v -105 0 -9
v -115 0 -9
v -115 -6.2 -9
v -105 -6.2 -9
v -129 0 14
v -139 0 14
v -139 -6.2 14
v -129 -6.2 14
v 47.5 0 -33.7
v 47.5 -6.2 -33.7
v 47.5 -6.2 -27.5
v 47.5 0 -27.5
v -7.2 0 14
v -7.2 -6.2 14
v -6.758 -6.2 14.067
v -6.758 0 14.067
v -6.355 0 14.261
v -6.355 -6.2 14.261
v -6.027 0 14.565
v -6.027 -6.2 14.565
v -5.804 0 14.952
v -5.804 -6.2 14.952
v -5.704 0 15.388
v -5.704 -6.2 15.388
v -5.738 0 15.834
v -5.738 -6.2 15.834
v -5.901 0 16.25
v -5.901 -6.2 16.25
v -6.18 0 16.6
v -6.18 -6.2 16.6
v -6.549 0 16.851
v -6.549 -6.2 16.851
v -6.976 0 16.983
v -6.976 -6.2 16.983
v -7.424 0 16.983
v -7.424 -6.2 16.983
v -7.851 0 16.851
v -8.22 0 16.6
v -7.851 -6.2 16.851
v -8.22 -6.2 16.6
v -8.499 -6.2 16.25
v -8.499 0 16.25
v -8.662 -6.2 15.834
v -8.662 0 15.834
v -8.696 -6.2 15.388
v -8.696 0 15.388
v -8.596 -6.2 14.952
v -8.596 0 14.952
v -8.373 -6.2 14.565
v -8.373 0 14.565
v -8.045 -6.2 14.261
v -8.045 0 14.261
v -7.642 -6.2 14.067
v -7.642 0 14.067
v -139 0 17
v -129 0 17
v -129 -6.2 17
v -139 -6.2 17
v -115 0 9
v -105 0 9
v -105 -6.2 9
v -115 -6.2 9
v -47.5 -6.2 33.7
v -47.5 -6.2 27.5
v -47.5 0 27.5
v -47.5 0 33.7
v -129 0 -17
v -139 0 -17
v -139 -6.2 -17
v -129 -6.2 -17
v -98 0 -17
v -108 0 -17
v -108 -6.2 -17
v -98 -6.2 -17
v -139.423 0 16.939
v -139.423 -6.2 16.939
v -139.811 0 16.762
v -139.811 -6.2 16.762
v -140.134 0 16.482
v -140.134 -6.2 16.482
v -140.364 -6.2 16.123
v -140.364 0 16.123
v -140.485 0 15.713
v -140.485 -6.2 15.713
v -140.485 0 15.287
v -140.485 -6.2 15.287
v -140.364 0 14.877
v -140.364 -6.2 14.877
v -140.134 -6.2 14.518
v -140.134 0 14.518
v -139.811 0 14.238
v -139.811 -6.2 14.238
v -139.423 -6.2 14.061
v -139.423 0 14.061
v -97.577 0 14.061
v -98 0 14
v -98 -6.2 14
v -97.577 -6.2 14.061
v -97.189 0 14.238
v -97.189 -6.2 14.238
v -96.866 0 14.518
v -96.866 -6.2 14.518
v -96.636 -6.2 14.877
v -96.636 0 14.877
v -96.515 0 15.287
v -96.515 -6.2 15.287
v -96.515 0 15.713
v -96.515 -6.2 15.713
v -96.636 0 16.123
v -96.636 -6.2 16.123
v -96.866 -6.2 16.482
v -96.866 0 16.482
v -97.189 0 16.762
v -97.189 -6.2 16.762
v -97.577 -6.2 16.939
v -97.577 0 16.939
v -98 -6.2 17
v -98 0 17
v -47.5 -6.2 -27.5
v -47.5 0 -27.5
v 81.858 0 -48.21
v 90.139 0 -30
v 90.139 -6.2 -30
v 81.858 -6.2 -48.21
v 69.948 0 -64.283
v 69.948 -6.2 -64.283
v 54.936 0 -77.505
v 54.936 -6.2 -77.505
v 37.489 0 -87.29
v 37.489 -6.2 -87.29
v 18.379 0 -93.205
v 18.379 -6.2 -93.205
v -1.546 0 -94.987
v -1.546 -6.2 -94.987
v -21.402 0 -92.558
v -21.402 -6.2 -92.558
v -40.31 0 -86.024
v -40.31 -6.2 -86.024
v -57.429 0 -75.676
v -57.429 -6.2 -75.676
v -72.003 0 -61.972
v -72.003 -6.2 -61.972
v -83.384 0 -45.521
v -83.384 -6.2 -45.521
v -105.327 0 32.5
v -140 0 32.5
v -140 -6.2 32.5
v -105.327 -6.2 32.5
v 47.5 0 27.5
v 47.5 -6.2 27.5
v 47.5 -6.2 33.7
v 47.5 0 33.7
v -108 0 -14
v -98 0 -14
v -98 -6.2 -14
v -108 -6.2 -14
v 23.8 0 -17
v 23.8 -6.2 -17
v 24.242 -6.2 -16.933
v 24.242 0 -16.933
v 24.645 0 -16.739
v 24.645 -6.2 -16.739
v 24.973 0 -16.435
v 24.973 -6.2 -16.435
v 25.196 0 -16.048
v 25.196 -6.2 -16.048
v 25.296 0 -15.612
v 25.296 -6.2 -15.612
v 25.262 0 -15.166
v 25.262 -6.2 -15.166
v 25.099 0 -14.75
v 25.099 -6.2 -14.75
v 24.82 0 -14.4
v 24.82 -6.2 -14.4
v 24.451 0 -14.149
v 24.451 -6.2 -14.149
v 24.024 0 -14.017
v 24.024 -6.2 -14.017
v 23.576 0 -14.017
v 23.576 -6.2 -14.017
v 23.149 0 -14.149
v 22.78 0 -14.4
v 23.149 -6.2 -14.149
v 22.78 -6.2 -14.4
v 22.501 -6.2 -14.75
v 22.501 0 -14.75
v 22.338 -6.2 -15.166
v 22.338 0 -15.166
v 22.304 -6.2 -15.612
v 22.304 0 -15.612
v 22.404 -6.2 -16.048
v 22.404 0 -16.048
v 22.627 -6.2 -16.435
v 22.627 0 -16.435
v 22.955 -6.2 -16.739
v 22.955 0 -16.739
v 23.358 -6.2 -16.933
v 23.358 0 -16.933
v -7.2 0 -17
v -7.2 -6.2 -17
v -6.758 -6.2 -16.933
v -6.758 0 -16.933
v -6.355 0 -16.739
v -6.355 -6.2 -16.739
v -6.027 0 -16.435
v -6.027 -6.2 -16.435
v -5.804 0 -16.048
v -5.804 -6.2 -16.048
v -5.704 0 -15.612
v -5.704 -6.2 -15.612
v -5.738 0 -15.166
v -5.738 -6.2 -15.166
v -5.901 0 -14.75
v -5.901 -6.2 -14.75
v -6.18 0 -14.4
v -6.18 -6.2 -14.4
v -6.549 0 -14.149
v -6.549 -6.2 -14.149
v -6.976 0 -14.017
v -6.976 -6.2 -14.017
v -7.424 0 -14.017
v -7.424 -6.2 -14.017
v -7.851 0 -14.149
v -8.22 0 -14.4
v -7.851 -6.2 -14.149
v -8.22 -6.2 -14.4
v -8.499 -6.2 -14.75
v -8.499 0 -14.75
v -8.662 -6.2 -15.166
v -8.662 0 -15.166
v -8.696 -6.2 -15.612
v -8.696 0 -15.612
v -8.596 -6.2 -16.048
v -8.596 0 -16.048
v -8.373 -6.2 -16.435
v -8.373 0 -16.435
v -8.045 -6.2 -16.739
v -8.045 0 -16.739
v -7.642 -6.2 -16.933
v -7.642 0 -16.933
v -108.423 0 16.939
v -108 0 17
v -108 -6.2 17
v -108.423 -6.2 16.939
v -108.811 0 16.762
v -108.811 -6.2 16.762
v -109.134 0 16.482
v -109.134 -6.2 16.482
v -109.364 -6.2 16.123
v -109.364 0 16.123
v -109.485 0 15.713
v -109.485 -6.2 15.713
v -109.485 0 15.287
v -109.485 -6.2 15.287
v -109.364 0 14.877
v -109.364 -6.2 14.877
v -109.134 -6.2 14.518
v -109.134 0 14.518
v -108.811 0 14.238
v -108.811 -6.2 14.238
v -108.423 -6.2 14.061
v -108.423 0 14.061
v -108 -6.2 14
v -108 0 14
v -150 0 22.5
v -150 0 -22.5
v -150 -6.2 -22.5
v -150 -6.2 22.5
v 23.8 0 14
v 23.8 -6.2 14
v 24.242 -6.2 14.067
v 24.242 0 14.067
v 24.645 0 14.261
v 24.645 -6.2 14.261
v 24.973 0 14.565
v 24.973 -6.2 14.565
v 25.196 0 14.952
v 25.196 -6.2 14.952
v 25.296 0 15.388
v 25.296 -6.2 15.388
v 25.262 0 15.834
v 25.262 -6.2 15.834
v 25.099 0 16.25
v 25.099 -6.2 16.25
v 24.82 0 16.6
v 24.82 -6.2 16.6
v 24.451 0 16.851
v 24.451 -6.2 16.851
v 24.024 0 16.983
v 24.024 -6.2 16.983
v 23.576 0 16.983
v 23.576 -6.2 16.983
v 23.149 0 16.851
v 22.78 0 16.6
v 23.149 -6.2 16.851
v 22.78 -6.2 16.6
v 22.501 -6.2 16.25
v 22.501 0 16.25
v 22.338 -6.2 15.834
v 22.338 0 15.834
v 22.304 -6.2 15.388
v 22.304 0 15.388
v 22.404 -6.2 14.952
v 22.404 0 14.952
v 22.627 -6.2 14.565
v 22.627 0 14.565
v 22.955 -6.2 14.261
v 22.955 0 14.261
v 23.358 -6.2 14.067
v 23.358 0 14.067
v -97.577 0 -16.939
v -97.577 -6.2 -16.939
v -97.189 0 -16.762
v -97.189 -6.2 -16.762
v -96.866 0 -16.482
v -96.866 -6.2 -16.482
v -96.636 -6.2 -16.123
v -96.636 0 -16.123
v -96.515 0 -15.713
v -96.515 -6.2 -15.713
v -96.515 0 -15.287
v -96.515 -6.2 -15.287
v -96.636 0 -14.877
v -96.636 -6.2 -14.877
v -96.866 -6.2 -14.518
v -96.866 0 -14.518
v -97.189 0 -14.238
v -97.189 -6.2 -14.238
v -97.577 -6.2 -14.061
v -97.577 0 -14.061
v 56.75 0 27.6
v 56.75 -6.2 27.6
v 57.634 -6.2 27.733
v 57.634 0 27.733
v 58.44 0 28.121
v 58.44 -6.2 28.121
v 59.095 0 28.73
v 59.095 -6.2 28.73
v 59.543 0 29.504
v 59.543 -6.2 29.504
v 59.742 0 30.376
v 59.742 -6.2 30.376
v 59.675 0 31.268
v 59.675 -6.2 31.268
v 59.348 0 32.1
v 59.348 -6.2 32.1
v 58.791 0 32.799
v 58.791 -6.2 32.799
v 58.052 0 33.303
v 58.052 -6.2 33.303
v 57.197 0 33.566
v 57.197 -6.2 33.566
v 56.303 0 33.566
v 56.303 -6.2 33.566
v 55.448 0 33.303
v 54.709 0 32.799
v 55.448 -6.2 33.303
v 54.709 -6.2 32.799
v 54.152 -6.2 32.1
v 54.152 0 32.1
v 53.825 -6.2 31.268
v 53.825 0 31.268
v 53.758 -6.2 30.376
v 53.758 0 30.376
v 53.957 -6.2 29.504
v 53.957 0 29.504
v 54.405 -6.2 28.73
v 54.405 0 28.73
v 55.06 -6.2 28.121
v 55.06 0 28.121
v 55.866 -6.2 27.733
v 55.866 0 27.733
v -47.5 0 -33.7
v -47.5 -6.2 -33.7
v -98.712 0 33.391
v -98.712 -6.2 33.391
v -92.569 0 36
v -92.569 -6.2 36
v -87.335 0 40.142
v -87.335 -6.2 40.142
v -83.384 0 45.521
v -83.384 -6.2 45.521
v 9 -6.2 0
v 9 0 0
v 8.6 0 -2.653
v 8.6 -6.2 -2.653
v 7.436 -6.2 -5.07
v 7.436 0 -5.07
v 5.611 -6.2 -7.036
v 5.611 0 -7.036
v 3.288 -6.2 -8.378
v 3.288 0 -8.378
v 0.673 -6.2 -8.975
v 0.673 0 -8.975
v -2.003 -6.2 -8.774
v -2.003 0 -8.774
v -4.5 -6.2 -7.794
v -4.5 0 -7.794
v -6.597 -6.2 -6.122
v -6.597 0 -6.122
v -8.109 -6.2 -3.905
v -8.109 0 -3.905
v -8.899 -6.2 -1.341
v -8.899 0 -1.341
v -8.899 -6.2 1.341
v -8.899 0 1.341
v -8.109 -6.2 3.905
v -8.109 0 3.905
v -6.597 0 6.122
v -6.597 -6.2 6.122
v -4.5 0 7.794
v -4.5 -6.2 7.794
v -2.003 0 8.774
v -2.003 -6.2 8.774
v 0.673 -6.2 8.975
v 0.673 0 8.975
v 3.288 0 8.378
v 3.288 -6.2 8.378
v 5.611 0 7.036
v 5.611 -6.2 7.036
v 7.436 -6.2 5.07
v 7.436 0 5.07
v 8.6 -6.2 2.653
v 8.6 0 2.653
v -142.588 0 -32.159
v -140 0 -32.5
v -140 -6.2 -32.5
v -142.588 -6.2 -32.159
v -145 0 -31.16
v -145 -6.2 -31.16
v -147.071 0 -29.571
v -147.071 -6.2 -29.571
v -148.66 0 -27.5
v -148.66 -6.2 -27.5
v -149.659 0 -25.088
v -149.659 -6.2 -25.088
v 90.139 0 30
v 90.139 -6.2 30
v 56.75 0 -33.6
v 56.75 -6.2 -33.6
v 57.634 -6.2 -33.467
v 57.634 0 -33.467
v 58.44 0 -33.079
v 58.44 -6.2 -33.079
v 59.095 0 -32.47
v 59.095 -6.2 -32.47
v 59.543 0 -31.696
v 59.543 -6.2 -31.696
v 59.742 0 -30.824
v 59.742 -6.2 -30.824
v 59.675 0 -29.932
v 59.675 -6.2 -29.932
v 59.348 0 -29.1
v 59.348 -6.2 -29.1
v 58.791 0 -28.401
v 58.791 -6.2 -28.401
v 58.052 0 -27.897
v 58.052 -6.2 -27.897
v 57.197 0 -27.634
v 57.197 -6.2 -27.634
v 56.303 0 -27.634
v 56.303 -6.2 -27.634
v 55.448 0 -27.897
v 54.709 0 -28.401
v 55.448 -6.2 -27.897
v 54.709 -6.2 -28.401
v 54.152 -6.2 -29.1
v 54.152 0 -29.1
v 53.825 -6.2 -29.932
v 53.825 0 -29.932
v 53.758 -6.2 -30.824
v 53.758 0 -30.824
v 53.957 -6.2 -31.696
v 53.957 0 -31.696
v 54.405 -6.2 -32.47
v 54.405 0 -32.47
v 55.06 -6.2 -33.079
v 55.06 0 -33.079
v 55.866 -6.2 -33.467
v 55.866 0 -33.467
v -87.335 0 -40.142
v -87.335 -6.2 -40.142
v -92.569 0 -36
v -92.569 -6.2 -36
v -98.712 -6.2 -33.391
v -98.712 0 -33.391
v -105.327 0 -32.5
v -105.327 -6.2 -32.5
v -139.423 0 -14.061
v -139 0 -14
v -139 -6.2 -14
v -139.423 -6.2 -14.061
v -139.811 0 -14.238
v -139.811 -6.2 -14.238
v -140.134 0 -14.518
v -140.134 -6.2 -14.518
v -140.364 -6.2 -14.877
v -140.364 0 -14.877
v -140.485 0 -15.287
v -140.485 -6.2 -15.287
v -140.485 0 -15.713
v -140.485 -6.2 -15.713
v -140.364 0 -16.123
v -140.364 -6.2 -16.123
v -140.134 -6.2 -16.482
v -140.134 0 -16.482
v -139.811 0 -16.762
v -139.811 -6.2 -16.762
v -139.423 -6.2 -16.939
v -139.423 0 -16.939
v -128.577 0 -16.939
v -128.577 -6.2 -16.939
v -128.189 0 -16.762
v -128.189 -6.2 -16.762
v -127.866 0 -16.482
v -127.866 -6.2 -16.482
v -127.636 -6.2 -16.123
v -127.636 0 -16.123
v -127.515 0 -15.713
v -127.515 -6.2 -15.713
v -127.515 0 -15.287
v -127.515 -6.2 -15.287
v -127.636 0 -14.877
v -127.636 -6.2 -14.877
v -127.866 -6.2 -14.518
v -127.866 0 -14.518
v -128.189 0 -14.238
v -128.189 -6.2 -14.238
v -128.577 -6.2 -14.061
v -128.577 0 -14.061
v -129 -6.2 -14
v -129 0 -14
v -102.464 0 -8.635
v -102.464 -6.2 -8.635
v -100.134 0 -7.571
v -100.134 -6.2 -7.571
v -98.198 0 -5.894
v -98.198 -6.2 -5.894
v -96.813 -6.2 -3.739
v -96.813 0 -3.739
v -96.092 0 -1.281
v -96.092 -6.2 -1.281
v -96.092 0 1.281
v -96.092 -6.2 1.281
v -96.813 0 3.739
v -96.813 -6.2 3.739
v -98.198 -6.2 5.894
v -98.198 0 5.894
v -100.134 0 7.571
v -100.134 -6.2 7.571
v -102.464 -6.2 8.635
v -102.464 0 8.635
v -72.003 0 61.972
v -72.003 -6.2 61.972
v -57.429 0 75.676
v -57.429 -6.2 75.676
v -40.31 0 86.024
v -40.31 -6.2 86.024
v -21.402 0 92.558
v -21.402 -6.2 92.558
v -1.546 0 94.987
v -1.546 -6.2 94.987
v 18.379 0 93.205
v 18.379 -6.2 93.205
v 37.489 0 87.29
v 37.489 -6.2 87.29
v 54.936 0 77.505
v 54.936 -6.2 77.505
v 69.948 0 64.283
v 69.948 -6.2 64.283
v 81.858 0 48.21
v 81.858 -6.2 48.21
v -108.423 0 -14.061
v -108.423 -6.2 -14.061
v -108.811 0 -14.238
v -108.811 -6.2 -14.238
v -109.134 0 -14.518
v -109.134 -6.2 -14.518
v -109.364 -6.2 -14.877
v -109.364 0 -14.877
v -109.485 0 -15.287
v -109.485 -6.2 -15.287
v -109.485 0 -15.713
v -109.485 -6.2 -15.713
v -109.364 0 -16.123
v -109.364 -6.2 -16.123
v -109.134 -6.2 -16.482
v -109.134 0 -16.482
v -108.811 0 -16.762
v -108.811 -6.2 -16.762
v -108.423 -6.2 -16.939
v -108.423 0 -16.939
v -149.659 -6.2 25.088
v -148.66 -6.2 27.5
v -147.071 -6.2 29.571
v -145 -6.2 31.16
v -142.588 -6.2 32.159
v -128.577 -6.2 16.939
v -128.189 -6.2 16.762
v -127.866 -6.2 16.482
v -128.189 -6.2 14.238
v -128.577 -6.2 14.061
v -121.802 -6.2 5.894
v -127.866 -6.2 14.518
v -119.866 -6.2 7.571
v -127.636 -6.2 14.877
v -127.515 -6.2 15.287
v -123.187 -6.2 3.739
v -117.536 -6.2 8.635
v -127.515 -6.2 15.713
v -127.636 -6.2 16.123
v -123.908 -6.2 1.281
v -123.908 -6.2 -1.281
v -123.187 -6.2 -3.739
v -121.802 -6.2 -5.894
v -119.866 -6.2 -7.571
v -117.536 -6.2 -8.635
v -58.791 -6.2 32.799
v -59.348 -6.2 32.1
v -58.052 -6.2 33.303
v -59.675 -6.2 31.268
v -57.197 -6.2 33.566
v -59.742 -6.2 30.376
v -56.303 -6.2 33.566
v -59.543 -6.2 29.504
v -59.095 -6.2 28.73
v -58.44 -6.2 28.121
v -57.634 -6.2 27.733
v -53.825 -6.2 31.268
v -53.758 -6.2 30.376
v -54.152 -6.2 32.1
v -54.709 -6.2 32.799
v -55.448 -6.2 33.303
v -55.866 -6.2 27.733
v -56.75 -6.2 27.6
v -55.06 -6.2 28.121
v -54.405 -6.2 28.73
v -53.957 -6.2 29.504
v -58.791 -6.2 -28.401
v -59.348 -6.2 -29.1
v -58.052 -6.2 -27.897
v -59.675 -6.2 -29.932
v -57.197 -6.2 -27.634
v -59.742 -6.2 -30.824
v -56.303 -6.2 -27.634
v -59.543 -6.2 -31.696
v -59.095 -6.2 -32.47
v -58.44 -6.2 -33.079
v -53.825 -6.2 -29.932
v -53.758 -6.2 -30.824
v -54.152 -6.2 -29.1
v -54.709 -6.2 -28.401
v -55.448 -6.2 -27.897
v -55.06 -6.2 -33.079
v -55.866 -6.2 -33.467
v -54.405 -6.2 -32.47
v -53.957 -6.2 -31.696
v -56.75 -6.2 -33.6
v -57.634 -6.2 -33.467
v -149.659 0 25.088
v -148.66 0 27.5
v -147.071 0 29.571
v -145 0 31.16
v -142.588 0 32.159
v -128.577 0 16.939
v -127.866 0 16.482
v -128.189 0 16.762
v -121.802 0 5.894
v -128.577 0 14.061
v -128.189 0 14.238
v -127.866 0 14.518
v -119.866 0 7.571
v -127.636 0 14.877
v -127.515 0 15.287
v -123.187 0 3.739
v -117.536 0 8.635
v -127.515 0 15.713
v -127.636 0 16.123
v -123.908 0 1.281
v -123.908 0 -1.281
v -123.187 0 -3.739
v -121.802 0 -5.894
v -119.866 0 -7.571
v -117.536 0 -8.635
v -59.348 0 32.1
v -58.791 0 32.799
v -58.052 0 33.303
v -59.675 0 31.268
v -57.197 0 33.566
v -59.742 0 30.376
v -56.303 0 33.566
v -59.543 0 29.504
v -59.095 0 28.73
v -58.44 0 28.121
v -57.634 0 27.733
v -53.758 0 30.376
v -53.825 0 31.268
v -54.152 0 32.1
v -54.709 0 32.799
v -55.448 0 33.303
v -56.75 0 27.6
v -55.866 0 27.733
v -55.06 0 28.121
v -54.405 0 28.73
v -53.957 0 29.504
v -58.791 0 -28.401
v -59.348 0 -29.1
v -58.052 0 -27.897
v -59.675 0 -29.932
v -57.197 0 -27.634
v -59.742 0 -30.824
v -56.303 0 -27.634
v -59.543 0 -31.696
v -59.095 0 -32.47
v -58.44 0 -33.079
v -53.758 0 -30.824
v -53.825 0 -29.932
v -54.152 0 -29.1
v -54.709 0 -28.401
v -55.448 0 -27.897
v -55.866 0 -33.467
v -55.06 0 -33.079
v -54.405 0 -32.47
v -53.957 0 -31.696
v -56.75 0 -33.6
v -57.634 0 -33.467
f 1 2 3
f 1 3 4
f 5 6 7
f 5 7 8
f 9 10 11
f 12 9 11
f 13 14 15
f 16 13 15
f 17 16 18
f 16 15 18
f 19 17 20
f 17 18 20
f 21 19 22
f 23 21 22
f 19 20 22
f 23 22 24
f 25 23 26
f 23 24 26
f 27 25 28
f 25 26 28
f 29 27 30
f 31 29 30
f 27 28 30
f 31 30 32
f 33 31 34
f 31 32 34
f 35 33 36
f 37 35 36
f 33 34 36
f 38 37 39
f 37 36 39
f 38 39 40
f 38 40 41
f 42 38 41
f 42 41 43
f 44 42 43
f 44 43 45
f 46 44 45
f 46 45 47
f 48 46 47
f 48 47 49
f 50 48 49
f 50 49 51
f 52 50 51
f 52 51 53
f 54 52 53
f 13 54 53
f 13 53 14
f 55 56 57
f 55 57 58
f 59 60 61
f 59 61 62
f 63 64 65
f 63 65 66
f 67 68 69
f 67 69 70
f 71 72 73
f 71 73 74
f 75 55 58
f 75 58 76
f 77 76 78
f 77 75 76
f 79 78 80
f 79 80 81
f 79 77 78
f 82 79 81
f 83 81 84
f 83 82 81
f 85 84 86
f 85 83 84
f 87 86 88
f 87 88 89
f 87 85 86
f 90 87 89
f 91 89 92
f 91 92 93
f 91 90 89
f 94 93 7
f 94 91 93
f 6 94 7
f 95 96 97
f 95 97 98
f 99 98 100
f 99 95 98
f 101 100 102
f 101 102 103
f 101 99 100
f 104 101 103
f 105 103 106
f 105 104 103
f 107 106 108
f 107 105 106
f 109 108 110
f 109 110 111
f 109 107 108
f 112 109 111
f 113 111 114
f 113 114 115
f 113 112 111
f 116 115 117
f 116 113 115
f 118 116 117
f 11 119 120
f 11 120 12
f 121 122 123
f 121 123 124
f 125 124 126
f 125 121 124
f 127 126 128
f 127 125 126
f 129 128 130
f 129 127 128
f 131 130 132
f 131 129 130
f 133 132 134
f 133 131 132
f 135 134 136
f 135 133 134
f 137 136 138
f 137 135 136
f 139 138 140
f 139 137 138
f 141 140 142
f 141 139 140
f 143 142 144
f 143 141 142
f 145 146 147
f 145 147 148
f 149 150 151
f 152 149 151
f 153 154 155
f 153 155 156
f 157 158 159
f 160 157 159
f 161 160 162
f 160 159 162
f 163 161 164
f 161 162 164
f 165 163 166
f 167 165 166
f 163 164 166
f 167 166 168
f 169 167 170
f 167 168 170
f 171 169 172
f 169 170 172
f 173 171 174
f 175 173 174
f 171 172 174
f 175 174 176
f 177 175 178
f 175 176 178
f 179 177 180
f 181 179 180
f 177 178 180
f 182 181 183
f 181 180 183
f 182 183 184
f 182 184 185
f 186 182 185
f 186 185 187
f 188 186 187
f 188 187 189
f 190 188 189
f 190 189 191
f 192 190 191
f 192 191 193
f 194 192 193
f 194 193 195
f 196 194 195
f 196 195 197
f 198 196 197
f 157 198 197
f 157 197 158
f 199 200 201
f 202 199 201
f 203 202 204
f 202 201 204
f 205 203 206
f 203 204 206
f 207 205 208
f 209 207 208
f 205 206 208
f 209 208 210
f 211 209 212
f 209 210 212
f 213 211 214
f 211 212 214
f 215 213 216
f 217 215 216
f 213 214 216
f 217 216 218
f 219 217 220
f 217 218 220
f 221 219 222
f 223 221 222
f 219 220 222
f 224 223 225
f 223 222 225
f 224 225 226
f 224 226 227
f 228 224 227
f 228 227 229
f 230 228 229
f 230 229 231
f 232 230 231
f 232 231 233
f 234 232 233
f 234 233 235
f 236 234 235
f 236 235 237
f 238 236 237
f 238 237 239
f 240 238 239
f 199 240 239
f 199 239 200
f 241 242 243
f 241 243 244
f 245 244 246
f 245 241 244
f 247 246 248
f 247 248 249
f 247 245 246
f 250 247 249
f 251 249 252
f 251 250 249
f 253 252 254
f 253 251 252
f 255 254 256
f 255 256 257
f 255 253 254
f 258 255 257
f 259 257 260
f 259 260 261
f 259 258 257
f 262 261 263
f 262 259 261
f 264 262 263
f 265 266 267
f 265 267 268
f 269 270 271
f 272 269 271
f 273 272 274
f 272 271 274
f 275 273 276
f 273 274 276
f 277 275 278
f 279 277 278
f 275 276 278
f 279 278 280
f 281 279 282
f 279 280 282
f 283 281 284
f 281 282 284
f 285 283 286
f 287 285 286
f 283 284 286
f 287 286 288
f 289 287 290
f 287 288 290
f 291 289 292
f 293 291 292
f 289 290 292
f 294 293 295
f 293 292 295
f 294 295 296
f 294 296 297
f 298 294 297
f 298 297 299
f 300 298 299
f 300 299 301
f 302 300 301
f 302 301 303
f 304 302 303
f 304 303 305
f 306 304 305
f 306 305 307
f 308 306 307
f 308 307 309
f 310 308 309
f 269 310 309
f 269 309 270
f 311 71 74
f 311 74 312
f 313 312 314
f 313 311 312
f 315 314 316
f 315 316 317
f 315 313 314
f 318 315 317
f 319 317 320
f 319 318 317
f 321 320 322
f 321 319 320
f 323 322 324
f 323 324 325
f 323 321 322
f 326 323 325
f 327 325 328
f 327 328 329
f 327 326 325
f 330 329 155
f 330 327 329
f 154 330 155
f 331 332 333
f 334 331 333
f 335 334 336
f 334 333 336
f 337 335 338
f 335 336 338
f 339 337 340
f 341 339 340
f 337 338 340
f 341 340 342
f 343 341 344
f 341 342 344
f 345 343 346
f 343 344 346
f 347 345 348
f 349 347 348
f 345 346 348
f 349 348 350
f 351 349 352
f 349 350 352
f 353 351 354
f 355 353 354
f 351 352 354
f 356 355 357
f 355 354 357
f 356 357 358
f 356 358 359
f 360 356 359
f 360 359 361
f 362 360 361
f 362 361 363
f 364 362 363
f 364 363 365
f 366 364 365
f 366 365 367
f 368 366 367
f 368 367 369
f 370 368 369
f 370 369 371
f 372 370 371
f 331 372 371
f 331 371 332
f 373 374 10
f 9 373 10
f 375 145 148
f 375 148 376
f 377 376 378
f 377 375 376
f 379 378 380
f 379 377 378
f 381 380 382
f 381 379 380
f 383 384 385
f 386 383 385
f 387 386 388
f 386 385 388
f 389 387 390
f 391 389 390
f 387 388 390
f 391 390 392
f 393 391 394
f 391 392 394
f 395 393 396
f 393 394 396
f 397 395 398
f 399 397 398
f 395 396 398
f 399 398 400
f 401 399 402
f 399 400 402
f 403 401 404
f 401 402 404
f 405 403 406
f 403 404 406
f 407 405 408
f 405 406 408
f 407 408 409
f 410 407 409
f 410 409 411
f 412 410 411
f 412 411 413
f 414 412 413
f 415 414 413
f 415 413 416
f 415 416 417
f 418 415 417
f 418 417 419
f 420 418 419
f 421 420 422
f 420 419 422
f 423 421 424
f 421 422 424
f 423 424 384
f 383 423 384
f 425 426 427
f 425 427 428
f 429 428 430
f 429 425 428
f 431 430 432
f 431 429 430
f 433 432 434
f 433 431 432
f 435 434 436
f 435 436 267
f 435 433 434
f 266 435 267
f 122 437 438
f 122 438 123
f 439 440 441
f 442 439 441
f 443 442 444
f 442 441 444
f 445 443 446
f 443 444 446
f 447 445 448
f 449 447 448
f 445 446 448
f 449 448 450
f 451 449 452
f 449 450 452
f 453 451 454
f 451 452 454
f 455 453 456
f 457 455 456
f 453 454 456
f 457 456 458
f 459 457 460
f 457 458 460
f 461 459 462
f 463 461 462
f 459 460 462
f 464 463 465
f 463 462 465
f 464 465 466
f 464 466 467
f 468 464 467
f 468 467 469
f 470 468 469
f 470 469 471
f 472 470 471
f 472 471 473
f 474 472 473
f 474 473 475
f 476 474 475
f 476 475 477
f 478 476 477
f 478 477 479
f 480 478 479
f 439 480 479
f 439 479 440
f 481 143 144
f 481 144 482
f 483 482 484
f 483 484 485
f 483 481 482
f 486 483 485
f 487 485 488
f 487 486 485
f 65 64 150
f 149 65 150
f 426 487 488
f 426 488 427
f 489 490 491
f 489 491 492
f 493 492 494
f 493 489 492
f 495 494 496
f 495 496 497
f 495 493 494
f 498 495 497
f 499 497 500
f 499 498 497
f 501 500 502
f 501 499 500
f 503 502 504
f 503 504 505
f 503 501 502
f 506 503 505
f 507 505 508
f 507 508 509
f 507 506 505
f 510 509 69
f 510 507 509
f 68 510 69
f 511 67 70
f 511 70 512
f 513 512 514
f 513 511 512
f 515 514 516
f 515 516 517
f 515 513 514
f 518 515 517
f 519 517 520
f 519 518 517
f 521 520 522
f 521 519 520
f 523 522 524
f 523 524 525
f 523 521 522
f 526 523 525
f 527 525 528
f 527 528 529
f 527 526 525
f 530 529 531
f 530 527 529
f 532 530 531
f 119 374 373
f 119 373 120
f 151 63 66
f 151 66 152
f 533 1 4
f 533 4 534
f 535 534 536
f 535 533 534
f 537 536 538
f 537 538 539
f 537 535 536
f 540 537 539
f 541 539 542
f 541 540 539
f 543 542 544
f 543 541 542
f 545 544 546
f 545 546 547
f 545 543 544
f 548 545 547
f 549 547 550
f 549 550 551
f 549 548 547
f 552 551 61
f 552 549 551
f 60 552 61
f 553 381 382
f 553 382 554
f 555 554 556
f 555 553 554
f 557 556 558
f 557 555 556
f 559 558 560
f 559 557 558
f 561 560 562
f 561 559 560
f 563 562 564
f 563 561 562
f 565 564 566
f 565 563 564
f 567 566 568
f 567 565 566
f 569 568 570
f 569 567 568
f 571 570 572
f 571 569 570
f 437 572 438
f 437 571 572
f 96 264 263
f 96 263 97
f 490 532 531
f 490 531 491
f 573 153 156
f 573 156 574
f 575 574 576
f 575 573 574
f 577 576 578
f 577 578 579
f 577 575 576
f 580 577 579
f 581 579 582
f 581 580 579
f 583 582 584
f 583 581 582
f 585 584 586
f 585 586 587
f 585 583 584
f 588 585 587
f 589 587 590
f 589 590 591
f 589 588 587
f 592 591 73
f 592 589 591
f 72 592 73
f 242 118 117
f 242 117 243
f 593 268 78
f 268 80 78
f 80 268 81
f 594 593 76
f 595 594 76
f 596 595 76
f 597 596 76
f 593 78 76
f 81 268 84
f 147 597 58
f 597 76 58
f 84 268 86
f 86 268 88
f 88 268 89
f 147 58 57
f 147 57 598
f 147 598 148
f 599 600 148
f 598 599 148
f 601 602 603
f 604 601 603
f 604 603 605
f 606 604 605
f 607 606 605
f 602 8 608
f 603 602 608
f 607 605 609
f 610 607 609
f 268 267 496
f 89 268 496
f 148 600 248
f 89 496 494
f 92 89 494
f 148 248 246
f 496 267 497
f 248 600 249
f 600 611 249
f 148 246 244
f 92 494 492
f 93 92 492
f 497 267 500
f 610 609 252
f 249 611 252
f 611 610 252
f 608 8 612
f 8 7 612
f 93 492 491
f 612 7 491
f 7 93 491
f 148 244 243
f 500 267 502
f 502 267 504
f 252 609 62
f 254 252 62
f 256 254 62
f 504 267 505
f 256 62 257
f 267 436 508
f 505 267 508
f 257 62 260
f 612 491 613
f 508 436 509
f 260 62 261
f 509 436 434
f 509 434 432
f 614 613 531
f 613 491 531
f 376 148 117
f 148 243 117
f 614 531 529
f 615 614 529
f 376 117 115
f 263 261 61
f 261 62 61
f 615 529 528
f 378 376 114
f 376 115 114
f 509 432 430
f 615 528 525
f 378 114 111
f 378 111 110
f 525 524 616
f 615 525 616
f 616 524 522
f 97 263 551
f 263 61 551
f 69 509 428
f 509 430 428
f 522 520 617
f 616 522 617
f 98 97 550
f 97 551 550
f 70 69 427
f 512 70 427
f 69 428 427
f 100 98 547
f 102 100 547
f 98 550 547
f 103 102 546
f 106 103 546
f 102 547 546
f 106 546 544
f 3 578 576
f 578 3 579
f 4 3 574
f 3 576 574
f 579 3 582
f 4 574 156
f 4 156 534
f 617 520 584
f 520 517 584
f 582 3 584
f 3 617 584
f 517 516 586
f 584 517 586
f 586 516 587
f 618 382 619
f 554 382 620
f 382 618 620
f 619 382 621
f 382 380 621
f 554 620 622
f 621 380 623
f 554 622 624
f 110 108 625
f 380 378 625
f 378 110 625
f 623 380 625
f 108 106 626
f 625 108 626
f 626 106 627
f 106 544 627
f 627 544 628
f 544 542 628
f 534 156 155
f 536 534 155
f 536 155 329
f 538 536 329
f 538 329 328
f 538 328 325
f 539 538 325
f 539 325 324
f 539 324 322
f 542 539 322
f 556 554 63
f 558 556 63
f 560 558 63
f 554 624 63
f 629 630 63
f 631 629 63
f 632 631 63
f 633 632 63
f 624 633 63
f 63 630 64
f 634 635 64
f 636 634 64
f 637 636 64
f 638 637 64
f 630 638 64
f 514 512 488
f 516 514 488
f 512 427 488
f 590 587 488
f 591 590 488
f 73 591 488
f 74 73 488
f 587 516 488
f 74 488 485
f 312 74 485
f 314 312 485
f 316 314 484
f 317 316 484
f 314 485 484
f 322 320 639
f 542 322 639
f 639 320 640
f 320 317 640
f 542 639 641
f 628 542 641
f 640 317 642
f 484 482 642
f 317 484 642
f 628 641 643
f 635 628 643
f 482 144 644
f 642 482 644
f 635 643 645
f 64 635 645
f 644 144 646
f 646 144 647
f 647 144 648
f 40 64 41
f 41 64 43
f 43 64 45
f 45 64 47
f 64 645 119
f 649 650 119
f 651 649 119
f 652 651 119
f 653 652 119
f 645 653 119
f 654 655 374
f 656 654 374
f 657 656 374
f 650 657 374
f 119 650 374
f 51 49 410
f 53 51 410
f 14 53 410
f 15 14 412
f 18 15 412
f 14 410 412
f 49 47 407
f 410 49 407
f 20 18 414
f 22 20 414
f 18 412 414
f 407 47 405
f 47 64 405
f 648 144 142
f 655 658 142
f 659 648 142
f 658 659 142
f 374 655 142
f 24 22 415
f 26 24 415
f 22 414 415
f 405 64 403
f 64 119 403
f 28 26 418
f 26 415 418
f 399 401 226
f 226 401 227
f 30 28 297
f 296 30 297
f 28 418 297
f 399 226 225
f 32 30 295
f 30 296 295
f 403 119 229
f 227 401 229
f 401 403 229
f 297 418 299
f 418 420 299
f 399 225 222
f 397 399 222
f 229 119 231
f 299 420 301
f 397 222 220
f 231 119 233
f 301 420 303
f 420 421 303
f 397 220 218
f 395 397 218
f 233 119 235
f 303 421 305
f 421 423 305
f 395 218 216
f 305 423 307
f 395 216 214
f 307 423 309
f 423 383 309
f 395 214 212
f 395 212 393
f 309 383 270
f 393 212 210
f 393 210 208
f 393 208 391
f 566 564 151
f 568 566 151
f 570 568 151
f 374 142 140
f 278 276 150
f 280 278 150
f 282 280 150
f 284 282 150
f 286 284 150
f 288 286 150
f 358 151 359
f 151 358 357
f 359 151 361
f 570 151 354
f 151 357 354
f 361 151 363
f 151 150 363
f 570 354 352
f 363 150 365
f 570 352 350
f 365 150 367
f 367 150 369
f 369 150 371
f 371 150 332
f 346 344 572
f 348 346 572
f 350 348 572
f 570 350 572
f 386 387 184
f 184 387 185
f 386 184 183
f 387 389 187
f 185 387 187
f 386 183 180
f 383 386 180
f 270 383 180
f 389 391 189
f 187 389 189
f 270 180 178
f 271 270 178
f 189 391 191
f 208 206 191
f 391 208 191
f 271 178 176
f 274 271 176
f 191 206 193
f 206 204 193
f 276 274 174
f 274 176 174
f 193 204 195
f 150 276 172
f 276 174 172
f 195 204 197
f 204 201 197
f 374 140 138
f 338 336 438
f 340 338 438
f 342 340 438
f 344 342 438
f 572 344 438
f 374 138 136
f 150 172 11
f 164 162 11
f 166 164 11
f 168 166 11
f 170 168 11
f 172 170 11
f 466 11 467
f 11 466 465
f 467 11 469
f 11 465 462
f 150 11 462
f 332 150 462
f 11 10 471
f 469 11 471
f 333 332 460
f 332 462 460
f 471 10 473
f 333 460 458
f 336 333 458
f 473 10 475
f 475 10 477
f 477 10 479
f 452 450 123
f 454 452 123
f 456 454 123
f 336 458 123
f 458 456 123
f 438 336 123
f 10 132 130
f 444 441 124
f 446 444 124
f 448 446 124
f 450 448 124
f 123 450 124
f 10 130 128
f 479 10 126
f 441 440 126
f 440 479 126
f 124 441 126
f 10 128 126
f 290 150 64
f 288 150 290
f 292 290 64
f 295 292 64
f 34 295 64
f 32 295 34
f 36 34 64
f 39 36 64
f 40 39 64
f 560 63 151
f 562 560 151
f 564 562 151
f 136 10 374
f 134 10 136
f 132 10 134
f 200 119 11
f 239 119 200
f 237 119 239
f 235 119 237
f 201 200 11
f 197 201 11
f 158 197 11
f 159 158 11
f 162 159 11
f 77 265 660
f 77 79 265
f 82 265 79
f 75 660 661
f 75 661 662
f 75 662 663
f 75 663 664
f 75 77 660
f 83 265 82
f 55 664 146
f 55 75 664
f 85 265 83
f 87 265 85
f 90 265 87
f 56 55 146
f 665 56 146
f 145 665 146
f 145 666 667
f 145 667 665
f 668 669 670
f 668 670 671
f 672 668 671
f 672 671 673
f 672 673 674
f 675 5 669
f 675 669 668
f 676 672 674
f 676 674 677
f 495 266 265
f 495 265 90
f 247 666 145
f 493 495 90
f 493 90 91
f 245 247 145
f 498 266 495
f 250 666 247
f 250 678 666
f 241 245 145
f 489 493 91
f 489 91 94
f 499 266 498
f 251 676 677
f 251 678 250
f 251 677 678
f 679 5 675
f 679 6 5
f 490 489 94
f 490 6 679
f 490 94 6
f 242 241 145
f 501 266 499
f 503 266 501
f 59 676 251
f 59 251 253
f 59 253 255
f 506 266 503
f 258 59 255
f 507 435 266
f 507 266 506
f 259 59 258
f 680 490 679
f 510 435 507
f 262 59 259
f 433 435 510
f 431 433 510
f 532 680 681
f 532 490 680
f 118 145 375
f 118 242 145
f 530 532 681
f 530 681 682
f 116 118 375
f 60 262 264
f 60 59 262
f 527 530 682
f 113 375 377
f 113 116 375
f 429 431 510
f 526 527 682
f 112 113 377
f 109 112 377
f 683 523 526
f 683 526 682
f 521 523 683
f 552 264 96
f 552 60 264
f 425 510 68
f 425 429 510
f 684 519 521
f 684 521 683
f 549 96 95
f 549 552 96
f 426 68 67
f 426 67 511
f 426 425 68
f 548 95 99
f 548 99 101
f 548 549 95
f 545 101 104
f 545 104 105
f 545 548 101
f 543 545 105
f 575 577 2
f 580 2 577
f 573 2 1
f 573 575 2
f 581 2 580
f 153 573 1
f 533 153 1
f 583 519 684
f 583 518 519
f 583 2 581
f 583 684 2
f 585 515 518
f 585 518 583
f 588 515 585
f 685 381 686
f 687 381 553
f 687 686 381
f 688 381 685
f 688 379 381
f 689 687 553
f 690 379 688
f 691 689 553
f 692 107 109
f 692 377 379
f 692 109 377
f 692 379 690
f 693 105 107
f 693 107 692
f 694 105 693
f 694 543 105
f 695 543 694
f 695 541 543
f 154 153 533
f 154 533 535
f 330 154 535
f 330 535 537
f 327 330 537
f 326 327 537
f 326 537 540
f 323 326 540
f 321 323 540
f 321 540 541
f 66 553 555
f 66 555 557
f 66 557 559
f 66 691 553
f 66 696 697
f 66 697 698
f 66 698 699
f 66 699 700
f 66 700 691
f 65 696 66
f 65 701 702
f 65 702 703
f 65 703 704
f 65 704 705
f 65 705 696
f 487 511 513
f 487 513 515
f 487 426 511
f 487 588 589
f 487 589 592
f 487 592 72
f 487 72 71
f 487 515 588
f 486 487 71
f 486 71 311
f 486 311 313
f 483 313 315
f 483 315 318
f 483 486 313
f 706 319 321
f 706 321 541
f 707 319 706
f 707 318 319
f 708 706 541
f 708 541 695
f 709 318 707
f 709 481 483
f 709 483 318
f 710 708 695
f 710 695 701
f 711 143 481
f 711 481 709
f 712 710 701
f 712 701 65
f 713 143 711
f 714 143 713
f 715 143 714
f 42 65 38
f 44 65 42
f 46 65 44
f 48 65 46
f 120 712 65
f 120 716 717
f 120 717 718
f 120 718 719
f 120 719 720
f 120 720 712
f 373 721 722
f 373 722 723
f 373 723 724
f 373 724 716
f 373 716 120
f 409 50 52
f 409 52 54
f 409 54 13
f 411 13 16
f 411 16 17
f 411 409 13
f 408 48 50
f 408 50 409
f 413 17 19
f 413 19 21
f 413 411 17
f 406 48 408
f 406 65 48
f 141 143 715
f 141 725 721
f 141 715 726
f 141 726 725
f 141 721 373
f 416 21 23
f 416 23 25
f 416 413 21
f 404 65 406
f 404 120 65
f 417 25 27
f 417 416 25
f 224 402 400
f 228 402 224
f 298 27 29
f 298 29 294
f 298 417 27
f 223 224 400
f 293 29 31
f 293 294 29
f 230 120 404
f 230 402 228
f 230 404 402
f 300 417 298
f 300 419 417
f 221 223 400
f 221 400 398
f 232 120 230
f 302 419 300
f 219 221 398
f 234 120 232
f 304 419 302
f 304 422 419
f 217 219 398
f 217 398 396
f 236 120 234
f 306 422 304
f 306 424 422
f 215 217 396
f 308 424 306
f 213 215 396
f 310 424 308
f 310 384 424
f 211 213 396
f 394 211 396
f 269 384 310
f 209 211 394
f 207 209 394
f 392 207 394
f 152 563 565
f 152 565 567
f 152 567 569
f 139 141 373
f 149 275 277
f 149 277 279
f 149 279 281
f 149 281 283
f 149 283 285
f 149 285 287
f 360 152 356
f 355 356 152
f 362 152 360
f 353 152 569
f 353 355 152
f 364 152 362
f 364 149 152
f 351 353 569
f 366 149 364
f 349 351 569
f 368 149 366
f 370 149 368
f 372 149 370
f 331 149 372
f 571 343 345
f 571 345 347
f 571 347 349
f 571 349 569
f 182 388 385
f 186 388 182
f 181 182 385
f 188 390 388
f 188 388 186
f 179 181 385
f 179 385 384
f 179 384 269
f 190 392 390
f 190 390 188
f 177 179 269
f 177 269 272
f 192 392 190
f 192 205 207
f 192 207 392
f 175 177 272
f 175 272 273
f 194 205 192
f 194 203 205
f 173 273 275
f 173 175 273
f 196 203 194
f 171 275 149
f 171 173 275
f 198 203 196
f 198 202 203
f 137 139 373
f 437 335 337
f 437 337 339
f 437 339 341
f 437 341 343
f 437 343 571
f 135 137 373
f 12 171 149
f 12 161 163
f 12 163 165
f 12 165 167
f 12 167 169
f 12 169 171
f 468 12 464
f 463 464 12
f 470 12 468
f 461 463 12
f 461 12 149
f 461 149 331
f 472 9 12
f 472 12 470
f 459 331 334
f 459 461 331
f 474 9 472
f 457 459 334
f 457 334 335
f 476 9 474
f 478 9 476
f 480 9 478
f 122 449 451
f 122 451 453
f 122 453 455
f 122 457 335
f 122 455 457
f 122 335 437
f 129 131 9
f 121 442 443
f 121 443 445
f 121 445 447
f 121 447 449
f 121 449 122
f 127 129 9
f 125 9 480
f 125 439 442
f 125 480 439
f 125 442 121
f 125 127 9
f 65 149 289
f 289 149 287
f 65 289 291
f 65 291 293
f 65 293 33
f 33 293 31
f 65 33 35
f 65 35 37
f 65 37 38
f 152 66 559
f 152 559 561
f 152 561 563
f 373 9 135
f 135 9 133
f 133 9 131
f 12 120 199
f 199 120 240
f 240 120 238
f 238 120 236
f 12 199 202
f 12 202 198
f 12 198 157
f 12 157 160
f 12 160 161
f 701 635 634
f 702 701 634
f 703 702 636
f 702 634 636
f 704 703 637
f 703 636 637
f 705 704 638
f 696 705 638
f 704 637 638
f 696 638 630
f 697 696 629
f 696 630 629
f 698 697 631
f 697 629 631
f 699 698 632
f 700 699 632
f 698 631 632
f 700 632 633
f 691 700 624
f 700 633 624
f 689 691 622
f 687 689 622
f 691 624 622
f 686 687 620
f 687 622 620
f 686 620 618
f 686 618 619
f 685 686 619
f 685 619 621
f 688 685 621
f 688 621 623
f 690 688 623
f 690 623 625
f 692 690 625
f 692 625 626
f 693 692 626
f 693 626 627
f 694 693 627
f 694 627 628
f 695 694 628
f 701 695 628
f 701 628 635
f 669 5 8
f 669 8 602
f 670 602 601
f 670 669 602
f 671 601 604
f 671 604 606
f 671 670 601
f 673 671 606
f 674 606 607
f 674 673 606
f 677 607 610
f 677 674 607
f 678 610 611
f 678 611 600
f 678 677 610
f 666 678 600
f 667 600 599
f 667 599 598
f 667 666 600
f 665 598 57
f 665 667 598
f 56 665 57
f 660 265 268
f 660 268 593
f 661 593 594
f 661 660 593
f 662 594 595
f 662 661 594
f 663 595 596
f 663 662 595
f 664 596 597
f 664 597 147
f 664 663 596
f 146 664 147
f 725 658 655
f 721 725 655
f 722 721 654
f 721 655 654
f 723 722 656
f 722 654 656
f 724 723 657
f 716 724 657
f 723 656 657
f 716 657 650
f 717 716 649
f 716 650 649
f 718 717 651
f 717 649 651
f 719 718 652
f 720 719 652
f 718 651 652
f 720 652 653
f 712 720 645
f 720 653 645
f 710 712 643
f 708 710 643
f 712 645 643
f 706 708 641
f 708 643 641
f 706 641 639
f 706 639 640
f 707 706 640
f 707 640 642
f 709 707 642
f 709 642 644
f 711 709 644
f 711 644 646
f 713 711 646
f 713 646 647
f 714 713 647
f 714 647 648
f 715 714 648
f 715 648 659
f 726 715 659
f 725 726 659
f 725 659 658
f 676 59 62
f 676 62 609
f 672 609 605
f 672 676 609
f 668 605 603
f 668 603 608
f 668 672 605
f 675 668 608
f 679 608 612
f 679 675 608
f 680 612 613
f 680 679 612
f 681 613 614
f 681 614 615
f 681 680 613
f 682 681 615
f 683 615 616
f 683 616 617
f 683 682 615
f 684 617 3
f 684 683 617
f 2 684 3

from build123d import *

# Parameters (mm, degrees)
SKETCH1_R           = 9
BOSS_EXTRUDE1_DEPTH = 6.2
CUT_EXTRUDE1_REACH  = 179.661
SKETCH2_R           = 1.5
CUT_EXTRUDE2_REACH  = 179.661
SKETCH3_R           = 3
LPATTERN1_COUNT     = 2
LPATTERN1_PITCH     = 61.2
CUT_EXTRUDE3_REACH  = 179.661
SKETCH5_W           = 95
SKETCH5_H           = 6.2


with BuildPart() as part:
    # Sketch1 → Boss-Extrude1 (new body)
    with BuildSketch(Plane(origin=(0, 0, 0), x_dir=(1, 0, 0), z_dir=(0, 1, 0))):
        with BuildLine():
            ThreePointArc((-140, 32.5), (-147.071067812, 29.571067812), (-150, 22.5))
            Line((-150, 22.5), (-150, -22.5))
            ThreePointArc((-150, -22.5), (-147.071067812, -29.571067812), (-140, -32.5))
            Line((-140, -32.5), (-105.326872165, -32.5))
            ThreePointArc((-105.326872165, -32.5), (-92.569113088, -36.000242249), (-83.383773797, -45.520833333))
            ThreePointArc((-83.383773797, -45.520833333), (8.463545381, -94.622240512), (90.138781887, -30))
            Line((90.138781887, -30), (90.138781887, 30))
            ThreePointArc((90.138781887, 30), (8.463545381, 94.622240512), (-83.383773797, 45.520833333))
            ThreePointArc((-83.383773797, 45.520833333), (-92.569113088, 36.000242249), (-105.326872165, 32.5))
            Line((-105.326872165, 32.5), (-140, 32.5))
        make_face()
        with BuildLine():
            ThreePointArc((-139, -17), (-140.5, -15.5), (-139, -14))
            Line((-139, -14), (-129, -14))
            ThreePointArc((-129, -14), (-127.5, -15.5), (-129, -17))
            Line((-129, -17), (-139, -17))
        make_face(mode=Mode.SUBTRACT)
        with BuildLine():
            ThreePointArc((-108, -17), (-109.5, -15.5), (-108, -14))
            Line((-108, -14), (-98, -14))
            ThreePointArc((-98, -14), (-96.5, -15.5), (-98, -17))
            Line((-98, -17), (-108, -17))
        make_face(mode=Mode.SUBTRACT)
        with BuildLine():
            ThreePointArc((-115, -9), (-124, 0), (-115, 9))
            Line((-115, 9), (-105, 9))
            ThreePointArc((-105, 9), (-96, 0), (-105, -9))
            Line((-105, -9), (-115, -9))
        make_face(mode=Mode.SUBTRACT)
        Circle(SKETCH1_R, mode=Mode.SUBTRACT)
        with BuildLine():
            ThreePointArc((-139, 14), (-140.5, 15.5), (-139, 17))
            Line((-139, 17), (-129, 17))
            ThreePointArc((-129, 17), (-127.5, 15.5), (-129, 14))
            Line((-129, 14), (-139, 14))
        make_face(mode=Mode.SUBTRACT)
        with BuildLine():
            ThreePointArc((-108, 14), (-109.5, 15.5), (-108, 17))
            Line((-108, 17), (-98, 17))
            ThreePointArc((-98, 17), (-96.5, 15.5), (-98, 14))
            Line((-98, 14), (-108, 14))
        make_face(mode=Mode.SUBTRACT)
    extrude(amount=-BOSS_EXTRUDE1_DEPTH)

    # Sketch2 → Cut-Extrude1 (cut, up to next)
    with BuildSketch(Plane.XZ.offset(6.2), mode=Mode.PRIVATE) as cut_extrude1_sk1:
        with Locations(Location((-7.2, 15.5, 0), (0, 0, 270))):
            Circle(SKETCH2_R)
    cut_extrude1_tool1 = extrude(cut_extrude1_sk1.sketch, amount=-CUT_EXTRUDE1_REACH, mode=Mode.PRIVATE) & part.part
    # Sketch2 → Cut-Extrude1 (cut, up to next)
    with BuildSketch(Plane.XZ.offset(6.2), mode=Mode.PRIVATE) as cut_extrude1_sk2:
        with Locations(Location((-7.2, -15.5, 0), (0, 0, 270))):
            Circle(SKETCH2_R)
    cut_extrude1_tool2 = extrude(cut_extrude1_sk2.sketch, amount=-CUT_EXTRUDE1_REACH, mode=Mode.PRIVATE) & part.part
    # Sketch2 → Cut-Extrude1 (cut, up to next)
    with BuildSketch(Plane.XZ.offset(6.2), mode=Mode.PRIVATE) as cut_extrude1_sk3:
        with Locations(Location((23.8, 15.5, 0), (0, 0, 270))):
            Circle(SKETCH2_R)
    cut_extrude1_tool3 = extrude(cut_extrude1_sk3.sketch, amount=-CUT_EXTRUDE1_REACH, mode=Mode.PRIVATE) & part.part
    # Sketch2 → Cut-Extrude1 (cut, up to next)
    with BuildSketch(Plane.XZ.offset(6.2), mode=Mode.PRIVATE) as cut_extrude1_sk4:
        with Locations(Location((23.8, -15.5, 0), (0, 0, 270))):
            Circle(SKETCH2_R)
    cut_extrude1_tool4 = extrude(cut_extrude1_sk4.sketch, amount=-CUT_EXTRUDE1_REACH, mode=Mode.PRIVATE) & part.part
    add(cut_extrude1_tool1.solids().sort_by_distance((-7.2, -6.2, 15.5))[0], mode=Mode.SUBTRACT)
    add(cut_extrude1_tool2.solids().sort_by_distance((-7.2, -6.2, -15.5))[0], mode=Mode.SUBTRACT)
    add(cut_extrude1_tool3.solids().sort_by_distance((23.8, -6.2, 15.5))[0], mode=Mode.SUBTRACT)
    add(cut_extrude1_tool4.solids().sort_by_distance((23.8, -6.2, -15.5))[0], mode=Mode.SUBTRACT)

    # Sketch3 → Cut-Extrude2 (cut, up to next)
    with BuildSketch(Plane.XZ.offset(6.2), mode=Mode.PRIVATE) as cut_extrude2_sk1:
        with Locations(Location((-56.75, -30.6, 0), (0, 0, 270))):
            Circle(SKETCH3_R)
    cut_extrude2_tool1 = extrude(cut_extrude2_sk1.sketch, amount=-CUT_EXTRUDE2_REACH, mode=Mode.PRIVATE) & part.part
    # Sketch3 → Cut-Extrude2 (cut, up to next)
    with BuildSketch(Plane.XZ.offset(6.2), mode=Mode.PRIVATE) as cut_extrude2_sk2:
        with Locations(Location((56.75, -30.6, 0), (0, 0, 270))):
            Circle(SKETCH3_R)
    cut_extrude2_tool2 = extrude(cut_extrude2_sk2.sketch, amount=-CUT_EXTRUDE2_REACH, mode=Mode.PRIVATE) & part.part
    cut_extrude2_1 = cut_extrude2_tool1.solids().sort_by_distance((-56.75, -6.2, -30.6))[0]
    add(cut_extrude2_1, mode=Mode.SUBTRACT)
    cut_extrude2_2 = cut_extrude2_tool2.solids().sort_by_distance((56.75, -6.2, -30.6))[0]
    add(cut_extrude2_2, mode=Mode.SUBTRACT)
    cut_extrude2 = cut_extrude2_1 + cut_extrude2_2  # Cut-Extrude2 as one shape, for the pattern or mirror that repeats it

    # LPattern1: Cut-Extrude2 ×2
    with Locations(*[(0, 0, i * LPATTERN1_PITCH) for i in range(1, LPATTERN1_COUNT)]):
        add(cut_extrude2, mode=Mode.SUBTRACT)

    # Sketch5 → Cut-Extrude3 (cut, up to next)
    with BuildSketch(Plane.XZ.offset(6.2), mode=Mode.PRIVATE) as cut_extrude3_sk1:
        with Locations((0, 30.6)):
            Rectangle(SKETCH5_W, SKETCH5_H)
    cut_extrude3_tool1 = extrude(cut_extrude3_sk1.sketch, amount=-CUT_EXTRUDE3_REACH, mode=Mode.PRIVATE) & part.part
    # Sketch5 → Cut-Extrude3 (cut, up to next)
    with BuildSketch(Plane.XZ.offset(6.2), mode=Mode.PRIVATE) as cut_extrude3_sk2:
        with Locations((0, -30.6)):
            Rectangle(SKETCH5_W, SKETCH5_H)
    cut_extrude3_tool2 = extrude(cut_extrude3_sk2.sketch, amount=-CUT_EXTRUDE3_REACH, mode=Mode.PRIVATE) & part.part
    add(cut_extrude3_tool1.solids().sort_by_distance((0, -6.2, 30.6))[0], mode=Mode.SUBTRACT)
    add(cut_extrude3_tool2.solids().sort_by_distance((0, -6.2, -30.6))[0], mode=Mode.SUBTRACT)


solid = part.part
